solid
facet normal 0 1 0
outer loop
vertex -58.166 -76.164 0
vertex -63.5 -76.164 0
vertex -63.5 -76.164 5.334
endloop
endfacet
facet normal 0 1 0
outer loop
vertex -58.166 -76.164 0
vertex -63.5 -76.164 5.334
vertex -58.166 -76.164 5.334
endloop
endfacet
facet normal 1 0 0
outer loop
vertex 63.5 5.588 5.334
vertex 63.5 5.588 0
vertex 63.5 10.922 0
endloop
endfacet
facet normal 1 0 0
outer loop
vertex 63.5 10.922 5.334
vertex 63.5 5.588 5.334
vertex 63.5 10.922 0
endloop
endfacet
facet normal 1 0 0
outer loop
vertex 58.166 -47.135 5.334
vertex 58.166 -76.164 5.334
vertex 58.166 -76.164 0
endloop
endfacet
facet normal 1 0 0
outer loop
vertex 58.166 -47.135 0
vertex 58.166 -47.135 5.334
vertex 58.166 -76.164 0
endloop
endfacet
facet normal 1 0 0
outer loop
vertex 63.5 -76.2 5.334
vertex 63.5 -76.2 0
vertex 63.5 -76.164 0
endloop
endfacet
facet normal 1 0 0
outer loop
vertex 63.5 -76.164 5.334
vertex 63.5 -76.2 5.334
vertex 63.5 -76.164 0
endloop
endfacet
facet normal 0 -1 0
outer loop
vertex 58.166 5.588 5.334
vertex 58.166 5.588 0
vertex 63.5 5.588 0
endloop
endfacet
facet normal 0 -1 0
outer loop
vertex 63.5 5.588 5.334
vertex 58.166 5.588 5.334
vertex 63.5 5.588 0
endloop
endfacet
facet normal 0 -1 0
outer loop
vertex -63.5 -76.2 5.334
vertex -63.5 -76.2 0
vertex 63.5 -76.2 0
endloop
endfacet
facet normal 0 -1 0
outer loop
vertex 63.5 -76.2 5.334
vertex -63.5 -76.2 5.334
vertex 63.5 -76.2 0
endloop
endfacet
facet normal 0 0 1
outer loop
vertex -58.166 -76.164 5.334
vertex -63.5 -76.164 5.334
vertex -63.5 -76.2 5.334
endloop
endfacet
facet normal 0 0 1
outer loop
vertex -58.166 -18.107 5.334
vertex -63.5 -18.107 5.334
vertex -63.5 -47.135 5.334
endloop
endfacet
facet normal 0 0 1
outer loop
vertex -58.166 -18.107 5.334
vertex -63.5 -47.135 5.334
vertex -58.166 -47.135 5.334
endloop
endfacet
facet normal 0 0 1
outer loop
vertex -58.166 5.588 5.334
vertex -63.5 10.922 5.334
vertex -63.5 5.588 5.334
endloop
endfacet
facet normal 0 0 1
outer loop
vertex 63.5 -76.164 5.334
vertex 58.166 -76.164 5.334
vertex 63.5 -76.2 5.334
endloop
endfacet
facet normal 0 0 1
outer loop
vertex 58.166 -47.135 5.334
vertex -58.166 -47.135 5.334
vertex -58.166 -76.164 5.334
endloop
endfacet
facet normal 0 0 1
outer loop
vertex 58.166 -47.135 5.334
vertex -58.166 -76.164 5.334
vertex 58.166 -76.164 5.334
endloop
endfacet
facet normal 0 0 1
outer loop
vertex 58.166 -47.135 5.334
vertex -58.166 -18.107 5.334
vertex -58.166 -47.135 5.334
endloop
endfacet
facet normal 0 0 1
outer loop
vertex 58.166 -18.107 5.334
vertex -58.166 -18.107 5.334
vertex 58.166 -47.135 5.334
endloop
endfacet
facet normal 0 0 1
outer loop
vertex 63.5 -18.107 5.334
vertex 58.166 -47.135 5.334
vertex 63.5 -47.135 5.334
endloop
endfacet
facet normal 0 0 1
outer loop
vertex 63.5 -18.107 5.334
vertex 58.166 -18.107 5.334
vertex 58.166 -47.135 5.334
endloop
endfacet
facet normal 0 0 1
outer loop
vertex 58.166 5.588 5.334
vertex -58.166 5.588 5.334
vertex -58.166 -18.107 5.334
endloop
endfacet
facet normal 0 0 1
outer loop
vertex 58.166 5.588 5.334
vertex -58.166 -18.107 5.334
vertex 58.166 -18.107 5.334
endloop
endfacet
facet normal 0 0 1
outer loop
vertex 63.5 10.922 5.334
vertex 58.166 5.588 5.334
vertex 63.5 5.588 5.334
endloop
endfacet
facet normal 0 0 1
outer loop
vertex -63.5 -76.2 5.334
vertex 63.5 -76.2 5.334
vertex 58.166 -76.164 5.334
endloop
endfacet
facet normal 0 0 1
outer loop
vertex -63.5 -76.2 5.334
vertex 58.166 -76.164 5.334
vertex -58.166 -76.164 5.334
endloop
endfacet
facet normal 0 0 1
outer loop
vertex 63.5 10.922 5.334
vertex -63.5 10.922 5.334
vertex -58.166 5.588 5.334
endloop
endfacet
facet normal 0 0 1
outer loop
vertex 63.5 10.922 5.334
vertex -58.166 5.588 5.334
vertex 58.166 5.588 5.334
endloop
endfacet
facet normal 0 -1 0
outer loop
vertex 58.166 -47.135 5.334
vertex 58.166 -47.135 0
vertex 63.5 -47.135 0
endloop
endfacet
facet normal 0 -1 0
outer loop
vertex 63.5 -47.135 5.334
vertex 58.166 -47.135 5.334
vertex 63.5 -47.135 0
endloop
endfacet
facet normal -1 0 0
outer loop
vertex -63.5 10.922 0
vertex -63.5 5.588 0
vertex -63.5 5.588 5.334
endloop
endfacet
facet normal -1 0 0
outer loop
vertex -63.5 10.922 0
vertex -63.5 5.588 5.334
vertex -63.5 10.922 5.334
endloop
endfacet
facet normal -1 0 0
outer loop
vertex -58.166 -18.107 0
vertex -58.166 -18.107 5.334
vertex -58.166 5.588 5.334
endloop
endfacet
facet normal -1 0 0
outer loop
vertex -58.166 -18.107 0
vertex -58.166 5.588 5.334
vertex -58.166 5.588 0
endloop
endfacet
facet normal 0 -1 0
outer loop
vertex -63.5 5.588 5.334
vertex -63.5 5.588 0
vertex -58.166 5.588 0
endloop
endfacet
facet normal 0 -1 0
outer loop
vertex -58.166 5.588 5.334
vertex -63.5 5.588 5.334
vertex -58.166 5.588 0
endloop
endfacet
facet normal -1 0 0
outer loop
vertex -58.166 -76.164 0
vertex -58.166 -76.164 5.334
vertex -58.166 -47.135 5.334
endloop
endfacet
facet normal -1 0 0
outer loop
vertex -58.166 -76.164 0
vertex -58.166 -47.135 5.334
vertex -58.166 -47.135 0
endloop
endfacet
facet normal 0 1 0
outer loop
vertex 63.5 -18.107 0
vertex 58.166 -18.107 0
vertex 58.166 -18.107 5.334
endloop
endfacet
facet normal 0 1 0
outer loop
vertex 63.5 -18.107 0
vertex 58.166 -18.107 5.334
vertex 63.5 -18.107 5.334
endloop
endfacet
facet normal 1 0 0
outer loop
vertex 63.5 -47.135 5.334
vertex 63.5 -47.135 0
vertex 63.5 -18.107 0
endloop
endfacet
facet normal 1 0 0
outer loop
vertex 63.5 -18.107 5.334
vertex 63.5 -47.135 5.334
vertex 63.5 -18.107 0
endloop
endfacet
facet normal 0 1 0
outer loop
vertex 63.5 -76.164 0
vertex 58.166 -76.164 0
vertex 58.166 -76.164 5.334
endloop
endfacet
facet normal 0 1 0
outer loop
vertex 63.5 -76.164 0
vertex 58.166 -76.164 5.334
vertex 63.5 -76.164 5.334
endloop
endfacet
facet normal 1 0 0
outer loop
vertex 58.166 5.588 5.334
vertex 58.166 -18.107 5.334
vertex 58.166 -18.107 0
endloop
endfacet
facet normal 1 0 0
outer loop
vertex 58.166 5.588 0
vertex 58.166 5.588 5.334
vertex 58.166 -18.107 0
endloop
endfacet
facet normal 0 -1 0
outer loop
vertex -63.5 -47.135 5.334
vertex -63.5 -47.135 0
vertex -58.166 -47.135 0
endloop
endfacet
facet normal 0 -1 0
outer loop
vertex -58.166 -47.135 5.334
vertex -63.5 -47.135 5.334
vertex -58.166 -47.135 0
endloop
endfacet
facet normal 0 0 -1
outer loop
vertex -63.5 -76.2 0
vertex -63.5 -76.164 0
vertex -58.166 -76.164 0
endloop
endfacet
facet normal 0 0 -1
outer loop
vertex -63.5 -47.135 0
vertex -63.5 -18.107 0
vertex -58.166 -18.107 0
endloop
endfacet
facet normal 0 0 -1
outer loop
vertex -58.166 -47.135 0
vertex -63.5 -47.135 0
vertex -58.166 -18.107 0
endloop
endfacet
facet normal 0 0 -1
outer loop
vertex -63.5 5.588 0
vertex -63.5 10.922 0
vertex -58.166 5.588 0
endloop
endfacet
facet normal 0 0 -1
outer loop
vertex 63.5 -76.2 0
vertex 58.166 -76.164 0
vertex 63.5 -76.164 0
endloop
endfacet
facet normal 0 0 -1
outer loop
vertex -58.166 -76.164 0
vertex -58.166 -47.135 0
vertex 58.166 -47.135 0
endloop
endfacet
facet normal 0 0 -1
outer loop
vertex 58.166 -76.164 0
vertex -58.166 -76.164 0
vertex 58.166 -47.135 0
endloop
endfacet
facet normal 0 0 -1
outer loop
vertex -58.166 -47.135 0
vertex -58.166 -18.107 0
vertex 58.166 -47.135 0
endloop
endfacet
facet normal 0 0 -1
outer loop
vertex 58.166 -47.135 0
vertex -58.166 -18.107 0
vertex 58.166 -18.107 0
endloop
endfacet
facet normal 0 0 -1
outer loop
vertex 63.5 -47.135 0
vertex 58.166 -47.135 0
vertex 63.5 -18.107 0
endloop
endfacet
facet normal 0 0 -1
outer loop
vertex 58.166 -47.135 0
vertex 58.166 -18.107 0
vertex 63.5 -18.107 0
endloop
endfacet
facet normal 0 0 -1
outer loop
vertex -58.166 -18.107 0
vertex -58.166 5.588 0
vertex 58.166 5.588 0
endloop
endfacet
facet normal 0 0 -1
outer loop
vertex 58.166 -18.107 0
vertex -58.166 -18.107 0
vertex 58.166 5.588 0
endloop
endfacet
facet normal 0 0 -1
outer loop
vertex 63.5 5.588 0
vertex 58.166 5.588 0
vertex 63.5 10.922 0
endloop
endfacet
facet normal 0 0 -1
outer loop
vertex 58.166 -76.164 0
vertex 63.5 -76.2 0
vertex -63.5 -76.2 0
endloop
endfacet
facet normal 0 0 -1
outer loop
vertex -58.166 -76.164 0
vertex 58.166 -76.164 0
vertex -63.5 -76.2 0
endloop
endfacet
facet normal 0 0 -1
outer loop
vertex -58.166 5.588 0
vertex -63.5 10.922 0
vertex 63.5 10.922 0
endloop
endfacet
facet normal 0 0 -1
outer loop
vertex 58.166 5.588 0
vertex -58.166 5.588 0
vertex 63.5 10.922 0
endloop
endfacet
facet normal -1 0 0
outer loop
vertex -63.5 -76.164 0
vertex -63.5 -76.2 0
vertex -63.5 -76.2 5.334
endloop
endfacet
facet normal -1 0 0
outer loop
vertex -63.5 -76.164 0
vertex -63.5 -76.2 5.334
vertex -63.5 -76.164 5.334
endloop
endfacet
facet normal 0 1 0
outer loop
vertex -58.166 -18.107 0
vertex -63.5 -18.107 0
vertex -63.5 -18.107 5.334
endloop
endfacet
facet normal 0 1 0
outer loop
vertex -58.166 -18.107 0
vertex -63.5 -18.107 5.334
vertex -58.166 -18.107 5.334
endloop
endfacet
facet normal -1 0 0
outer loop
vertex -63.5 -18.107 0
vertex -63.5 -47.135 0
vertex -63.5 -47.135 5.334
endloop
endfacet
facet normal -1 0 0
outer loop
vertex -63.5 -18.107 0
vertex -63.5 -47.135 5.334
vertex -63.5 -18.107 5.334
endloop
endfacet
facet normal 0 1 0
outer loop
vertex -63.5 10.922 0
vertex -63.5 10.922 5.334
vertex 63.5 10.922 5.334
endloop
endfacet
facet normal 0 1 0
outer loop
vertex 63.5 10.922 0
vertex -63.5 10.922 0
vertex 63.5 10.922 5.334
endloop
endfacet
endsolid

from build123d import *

# Parameters (mm, degrees)
SKETCH2_W           = 127
SKETCH2_H           = 152.4
BOSS_EXTRUDE2_DEPTH = 5.334
SKETCH3_W           = 127
SKETCH3_H           = 65.278
CUT_EXTRUDE1_DEPTH  = 100.333486579
CAVITY1_START       = -76.163714286
CAVITY1_OUTLINE_W   = 5.334
CAVITY1_OUTLINE_H   = 5.334
CAVITY1_DEPTH       = 29.028571429
CAVITY1_START_2     = -18.106571429
CAVITY1_2_OUTLINE_W = 5.334
CAVITY1_2_OUTLINE_H = 5.334
CAVITY1_2_DEPTH     = 23.694571429


# Read off the part's stored shape, not the designer's step: Cavity1
with BuildPart() as part:
    # Sketch2 → Boss-Extrude2 (new body)
    with BuildSketch(Plane.XY):
        Rectangle(SKETCH2_W, SKETCH2_H)
    extrude(amount=BOSS_EXTRUDE2_DEPTH)

    # Sketch3 → Cut-Extrude1 (cut, through all)
    with BuildSketch(Plane.XY.offset(5.334)):
        with Locations((0, 43.561)):
            Rectangle(SKETCH3_W, SKETCH3_H)
    extrude(amount=-CUT_EXTRUDE1_DEPTH, mode=Mode.SUBTRACT)

    # Cavity1 outline → Cavity1 (cut)
    with BuildSketch(Plane(origin=(0, 0, 0), x_dir=(1, 0, 0), z_dir=(0, 1, 0)).offset(CAVITY1_START)):
        with Locations((60.833, -2.667)):
            Rectangle(CAVITY1_OUTLINE_W, CAVITY1_OUTLINE_H)
        with Locations((-60.833, -2.667)):
            Rectangle(CAVITY1_OUTLINE_W, CAVITY1_OUTLINE_H)
    extrude(amount=CAVITY1_DEPTH, mode=Mode.SUBTRACT)

    # Cavity1 2 outline → Cavity1 2 (cut)
    with BuildSketch(Plane(origin=(0, 0, 0), x_dir=(1, 0, 0), z_dir=(0, 1, 0)).offset(CAVITY1_START_2)):
        with Locations((60.833, -2.667)):
            Rectangle(CAVITY1_2_OUTLINE_W, CAVITY1_2_OUTLINE_H)
        with Locations((-60.833, -2.667)):
            Rectangle(CAVITY1_2_OUTLINE_W, CAVITY1_2_OUTLINE_H)
    extrude(amount=CAVITY1_2_DEPTH, mode=Mode.SUBTRACT)


solid = part.part
